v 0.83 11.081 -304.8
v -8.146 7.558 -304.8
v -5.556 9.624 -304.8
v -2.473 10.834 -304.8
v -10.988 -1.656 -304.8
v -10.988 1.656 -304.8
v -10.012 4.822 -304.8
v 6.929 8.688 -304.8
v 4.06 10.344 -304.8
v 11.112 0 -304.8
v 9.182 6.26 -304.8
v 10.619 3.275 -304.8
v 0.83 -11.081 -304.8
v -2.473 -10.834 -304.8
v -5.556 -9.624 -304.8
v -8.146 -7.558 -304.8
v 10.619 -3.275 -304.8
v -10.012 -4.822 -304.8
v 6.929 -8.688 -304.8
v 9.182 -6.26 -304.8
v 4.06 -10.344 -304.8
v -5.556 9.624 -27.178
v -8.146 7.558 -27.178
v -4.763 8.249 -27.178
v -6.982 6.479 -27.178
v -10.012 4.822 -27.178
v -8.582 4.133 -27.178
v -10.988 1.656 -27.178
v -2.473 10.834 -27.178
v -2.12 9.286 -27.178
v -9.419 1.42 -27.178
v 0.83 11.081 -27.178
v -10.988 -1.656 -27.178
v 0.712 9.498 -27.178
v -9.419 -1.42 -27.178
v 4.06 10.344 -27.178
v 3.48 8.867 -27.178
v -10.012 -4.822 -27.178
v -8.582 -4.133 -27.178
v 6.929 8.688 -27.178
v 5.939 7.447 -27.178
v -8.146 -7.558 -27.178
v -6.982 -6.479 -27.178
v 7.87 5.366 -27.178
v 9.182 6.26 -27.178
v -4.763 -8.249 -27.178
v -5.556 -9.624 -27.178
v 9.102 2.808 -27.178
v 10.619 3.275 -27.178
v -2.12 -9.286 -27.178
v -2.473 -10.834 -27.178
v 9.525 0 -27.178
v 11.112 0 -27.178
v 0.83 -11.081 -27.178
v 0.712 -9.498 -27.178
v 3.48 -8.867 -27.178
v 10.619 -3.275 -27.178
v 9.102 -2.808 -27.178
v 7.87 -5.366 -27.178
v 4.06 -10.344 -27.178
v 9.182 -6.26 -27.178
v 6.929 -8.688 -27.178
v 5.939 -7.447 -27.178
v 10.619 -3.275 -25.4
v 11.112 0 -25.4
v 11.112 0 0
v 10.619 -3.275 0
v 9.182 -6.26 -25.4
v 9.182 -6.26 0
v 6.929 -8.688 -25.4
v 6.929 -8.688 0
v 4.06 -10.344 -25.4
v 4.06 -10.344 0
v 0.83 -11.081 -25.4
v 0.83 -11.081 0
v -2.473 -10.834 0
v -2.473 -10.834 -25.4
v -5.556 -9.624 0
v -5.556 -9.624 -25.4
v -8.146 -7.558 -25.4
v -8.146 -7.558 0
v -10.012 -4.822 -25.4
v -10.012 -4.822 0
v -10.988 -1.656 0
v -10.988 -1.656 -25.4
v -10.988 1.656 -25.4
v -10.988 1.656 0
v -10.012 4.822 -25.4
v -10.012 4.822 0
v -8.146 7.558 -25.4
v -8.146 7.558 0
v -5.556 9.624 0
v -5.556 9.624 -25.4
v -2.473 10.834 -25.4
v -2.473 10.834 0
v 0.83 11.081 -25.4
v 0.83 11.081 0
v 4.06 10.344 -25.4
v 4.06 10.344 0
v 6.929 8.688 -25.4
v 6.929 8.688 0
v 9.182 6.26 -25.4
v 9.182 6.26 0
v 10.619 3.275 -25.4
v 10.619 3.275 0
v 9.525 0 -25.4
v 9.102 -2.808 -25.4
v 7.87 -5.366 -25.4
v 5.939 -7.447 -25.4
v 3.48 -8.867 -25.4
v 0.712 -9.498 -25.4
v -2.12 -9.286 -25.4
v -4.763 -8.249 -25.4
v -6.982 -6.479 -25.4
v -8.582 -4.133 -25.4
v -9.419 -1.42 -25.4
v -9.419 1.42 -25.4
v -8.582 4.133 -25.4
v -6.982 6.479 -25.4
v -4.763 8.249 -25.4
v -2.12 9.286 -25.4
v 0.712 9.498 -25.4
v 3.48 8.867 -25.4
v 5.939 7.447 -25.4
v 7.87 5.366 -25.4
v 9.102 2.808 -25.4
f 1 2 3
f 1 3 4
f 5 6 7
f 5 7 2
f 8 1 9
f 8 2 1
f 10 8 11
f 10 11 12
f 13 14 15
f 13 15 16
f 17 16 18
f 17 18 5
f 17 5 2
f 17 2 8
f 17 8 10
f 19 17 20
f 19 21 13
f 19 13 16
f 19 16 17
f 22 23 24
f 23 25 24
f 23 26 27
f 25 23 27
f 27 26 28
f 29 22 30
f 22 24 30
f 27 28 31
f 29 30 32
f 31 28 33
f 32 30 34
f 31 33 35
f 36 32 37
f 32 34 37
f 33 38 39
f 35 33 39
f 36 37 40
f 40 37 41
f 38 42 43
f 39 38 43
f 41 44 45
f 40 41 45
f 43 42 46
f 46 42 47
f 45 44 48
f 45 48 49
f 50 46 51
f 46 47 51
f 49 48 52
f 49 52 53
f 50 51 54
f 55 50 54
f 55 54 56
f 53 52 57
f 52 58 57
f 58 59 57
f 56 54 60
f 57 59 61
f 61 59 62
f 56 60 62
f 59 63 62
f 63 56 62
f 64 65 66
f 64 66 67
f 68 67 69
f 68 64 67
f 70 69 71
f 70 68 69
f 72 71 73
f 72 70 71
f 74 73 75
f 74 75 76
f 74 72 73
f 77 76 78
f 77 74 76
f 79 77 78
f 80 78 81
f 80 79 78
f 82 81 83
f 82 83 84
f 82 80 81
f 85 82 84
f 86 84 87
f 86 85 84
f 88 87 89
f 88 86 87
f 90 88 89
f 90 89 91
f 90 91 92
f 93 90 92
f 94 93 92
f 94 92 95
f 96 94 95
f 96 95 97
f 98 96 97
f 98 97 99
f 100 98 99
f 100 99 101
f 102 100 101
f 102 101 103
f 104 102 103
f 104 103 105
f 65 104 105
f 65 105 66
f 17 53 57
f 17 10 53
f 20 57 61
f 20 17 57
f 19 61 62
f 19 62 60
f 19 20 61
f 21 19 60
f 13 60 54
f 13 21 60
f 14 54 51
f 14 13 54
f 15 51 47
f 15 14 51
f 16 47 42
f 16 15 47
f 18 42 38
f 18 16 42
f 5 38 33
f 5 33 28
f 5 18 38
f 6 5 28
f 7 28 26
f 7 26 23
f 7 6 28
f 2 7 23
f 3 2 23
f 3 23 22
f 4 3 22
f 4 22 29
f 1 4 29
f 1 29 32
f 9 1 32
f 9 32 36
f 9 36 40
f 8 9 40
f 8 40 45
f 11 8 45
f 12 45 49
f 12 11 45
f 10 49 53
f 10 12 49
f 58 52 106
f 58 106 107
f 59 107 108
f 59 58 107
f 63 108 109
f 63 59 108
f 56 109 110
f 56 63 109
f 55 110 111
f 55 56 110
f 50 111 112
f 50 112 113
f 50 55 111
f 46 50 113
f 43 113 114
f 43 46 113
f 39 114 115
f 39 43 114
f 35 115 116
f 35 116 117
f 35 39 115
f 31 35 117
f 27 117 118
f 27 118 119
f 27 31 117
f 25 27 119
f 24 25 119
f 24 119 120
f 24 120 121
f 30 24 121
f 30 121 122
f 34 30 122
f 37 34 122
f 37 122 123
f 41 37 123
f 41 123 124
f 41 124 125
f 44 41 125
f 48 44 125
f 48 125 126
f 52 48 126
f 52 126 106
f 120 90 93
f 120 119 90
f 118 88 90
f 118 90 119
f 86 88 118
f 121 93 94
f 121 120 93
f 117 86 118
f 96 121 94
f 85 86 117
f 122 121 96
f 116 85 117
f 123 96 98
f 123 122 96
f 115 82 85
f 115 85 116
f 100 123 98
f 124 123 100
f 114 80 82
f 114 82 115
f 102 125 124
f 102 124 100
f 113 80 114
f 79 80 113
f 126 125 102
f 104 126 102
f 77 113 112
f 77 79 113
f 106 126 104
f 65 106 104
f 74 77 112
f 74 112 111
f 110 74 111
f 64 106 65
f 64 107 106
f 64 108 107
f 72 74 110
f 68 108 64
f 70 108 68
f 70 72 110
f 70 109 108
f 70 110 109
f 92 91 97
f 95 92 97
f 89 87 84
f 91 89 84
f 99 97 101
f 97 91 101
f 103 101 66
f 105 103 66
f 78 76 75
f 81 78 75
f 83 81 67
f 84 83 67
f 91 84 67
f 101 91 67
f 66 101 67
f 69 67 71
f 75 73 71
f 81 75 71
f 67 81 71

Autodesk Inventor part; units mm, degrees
ref_plane "YZ Plane" through (0, 0, 0) normal (1, 0, 0) x (0, 1, 0)
ref_plane "XZ Plane" through (0, 0, 0) normal (0, 1, 0) x (-1, 0, 0)
ref_plane "XY Plane" through (0, 0, 0) normal (0, 0, 1) x (1, 0, 0)
sketch "Sketch1" plane through (0, 0, 0) normal (0, 1, 0) x (-1, 0, 0)
  line L0 (0, 0) -> (-11.1125, 0)
  line L1 (-11.1125, 0) -> (-11.1125, -334.6595)
  line L2 (-11.1125, -25.4) -> (-9.525, -25.4)
  line L3 (-9.525, -25.4) -> (-9.525, -27.178)
  line L4 (-9.525, -27.178) -> (-11.1125, -27.178)
  line L5 (0, 0) -> (0, -334.6595)
  line L6 (-11.1125, -304.8) -> (0, -304.8)
  dimension "d0" = 11.1125
  dimension "d2" = 334.6595
  dimension "d4" = 25.4
  dimension "d5" = 1.778
  dimension "d6" = 1.5875
  dimension "d7" = 304.8
revolve "Revolution1" add sketch "Sketch1" angle 360 about axis through (0, 0, 0) along (0, 0, -1) contours L5 L6 L1 L4 L3 L2 L0
properties part number "3 Piston Rod"
